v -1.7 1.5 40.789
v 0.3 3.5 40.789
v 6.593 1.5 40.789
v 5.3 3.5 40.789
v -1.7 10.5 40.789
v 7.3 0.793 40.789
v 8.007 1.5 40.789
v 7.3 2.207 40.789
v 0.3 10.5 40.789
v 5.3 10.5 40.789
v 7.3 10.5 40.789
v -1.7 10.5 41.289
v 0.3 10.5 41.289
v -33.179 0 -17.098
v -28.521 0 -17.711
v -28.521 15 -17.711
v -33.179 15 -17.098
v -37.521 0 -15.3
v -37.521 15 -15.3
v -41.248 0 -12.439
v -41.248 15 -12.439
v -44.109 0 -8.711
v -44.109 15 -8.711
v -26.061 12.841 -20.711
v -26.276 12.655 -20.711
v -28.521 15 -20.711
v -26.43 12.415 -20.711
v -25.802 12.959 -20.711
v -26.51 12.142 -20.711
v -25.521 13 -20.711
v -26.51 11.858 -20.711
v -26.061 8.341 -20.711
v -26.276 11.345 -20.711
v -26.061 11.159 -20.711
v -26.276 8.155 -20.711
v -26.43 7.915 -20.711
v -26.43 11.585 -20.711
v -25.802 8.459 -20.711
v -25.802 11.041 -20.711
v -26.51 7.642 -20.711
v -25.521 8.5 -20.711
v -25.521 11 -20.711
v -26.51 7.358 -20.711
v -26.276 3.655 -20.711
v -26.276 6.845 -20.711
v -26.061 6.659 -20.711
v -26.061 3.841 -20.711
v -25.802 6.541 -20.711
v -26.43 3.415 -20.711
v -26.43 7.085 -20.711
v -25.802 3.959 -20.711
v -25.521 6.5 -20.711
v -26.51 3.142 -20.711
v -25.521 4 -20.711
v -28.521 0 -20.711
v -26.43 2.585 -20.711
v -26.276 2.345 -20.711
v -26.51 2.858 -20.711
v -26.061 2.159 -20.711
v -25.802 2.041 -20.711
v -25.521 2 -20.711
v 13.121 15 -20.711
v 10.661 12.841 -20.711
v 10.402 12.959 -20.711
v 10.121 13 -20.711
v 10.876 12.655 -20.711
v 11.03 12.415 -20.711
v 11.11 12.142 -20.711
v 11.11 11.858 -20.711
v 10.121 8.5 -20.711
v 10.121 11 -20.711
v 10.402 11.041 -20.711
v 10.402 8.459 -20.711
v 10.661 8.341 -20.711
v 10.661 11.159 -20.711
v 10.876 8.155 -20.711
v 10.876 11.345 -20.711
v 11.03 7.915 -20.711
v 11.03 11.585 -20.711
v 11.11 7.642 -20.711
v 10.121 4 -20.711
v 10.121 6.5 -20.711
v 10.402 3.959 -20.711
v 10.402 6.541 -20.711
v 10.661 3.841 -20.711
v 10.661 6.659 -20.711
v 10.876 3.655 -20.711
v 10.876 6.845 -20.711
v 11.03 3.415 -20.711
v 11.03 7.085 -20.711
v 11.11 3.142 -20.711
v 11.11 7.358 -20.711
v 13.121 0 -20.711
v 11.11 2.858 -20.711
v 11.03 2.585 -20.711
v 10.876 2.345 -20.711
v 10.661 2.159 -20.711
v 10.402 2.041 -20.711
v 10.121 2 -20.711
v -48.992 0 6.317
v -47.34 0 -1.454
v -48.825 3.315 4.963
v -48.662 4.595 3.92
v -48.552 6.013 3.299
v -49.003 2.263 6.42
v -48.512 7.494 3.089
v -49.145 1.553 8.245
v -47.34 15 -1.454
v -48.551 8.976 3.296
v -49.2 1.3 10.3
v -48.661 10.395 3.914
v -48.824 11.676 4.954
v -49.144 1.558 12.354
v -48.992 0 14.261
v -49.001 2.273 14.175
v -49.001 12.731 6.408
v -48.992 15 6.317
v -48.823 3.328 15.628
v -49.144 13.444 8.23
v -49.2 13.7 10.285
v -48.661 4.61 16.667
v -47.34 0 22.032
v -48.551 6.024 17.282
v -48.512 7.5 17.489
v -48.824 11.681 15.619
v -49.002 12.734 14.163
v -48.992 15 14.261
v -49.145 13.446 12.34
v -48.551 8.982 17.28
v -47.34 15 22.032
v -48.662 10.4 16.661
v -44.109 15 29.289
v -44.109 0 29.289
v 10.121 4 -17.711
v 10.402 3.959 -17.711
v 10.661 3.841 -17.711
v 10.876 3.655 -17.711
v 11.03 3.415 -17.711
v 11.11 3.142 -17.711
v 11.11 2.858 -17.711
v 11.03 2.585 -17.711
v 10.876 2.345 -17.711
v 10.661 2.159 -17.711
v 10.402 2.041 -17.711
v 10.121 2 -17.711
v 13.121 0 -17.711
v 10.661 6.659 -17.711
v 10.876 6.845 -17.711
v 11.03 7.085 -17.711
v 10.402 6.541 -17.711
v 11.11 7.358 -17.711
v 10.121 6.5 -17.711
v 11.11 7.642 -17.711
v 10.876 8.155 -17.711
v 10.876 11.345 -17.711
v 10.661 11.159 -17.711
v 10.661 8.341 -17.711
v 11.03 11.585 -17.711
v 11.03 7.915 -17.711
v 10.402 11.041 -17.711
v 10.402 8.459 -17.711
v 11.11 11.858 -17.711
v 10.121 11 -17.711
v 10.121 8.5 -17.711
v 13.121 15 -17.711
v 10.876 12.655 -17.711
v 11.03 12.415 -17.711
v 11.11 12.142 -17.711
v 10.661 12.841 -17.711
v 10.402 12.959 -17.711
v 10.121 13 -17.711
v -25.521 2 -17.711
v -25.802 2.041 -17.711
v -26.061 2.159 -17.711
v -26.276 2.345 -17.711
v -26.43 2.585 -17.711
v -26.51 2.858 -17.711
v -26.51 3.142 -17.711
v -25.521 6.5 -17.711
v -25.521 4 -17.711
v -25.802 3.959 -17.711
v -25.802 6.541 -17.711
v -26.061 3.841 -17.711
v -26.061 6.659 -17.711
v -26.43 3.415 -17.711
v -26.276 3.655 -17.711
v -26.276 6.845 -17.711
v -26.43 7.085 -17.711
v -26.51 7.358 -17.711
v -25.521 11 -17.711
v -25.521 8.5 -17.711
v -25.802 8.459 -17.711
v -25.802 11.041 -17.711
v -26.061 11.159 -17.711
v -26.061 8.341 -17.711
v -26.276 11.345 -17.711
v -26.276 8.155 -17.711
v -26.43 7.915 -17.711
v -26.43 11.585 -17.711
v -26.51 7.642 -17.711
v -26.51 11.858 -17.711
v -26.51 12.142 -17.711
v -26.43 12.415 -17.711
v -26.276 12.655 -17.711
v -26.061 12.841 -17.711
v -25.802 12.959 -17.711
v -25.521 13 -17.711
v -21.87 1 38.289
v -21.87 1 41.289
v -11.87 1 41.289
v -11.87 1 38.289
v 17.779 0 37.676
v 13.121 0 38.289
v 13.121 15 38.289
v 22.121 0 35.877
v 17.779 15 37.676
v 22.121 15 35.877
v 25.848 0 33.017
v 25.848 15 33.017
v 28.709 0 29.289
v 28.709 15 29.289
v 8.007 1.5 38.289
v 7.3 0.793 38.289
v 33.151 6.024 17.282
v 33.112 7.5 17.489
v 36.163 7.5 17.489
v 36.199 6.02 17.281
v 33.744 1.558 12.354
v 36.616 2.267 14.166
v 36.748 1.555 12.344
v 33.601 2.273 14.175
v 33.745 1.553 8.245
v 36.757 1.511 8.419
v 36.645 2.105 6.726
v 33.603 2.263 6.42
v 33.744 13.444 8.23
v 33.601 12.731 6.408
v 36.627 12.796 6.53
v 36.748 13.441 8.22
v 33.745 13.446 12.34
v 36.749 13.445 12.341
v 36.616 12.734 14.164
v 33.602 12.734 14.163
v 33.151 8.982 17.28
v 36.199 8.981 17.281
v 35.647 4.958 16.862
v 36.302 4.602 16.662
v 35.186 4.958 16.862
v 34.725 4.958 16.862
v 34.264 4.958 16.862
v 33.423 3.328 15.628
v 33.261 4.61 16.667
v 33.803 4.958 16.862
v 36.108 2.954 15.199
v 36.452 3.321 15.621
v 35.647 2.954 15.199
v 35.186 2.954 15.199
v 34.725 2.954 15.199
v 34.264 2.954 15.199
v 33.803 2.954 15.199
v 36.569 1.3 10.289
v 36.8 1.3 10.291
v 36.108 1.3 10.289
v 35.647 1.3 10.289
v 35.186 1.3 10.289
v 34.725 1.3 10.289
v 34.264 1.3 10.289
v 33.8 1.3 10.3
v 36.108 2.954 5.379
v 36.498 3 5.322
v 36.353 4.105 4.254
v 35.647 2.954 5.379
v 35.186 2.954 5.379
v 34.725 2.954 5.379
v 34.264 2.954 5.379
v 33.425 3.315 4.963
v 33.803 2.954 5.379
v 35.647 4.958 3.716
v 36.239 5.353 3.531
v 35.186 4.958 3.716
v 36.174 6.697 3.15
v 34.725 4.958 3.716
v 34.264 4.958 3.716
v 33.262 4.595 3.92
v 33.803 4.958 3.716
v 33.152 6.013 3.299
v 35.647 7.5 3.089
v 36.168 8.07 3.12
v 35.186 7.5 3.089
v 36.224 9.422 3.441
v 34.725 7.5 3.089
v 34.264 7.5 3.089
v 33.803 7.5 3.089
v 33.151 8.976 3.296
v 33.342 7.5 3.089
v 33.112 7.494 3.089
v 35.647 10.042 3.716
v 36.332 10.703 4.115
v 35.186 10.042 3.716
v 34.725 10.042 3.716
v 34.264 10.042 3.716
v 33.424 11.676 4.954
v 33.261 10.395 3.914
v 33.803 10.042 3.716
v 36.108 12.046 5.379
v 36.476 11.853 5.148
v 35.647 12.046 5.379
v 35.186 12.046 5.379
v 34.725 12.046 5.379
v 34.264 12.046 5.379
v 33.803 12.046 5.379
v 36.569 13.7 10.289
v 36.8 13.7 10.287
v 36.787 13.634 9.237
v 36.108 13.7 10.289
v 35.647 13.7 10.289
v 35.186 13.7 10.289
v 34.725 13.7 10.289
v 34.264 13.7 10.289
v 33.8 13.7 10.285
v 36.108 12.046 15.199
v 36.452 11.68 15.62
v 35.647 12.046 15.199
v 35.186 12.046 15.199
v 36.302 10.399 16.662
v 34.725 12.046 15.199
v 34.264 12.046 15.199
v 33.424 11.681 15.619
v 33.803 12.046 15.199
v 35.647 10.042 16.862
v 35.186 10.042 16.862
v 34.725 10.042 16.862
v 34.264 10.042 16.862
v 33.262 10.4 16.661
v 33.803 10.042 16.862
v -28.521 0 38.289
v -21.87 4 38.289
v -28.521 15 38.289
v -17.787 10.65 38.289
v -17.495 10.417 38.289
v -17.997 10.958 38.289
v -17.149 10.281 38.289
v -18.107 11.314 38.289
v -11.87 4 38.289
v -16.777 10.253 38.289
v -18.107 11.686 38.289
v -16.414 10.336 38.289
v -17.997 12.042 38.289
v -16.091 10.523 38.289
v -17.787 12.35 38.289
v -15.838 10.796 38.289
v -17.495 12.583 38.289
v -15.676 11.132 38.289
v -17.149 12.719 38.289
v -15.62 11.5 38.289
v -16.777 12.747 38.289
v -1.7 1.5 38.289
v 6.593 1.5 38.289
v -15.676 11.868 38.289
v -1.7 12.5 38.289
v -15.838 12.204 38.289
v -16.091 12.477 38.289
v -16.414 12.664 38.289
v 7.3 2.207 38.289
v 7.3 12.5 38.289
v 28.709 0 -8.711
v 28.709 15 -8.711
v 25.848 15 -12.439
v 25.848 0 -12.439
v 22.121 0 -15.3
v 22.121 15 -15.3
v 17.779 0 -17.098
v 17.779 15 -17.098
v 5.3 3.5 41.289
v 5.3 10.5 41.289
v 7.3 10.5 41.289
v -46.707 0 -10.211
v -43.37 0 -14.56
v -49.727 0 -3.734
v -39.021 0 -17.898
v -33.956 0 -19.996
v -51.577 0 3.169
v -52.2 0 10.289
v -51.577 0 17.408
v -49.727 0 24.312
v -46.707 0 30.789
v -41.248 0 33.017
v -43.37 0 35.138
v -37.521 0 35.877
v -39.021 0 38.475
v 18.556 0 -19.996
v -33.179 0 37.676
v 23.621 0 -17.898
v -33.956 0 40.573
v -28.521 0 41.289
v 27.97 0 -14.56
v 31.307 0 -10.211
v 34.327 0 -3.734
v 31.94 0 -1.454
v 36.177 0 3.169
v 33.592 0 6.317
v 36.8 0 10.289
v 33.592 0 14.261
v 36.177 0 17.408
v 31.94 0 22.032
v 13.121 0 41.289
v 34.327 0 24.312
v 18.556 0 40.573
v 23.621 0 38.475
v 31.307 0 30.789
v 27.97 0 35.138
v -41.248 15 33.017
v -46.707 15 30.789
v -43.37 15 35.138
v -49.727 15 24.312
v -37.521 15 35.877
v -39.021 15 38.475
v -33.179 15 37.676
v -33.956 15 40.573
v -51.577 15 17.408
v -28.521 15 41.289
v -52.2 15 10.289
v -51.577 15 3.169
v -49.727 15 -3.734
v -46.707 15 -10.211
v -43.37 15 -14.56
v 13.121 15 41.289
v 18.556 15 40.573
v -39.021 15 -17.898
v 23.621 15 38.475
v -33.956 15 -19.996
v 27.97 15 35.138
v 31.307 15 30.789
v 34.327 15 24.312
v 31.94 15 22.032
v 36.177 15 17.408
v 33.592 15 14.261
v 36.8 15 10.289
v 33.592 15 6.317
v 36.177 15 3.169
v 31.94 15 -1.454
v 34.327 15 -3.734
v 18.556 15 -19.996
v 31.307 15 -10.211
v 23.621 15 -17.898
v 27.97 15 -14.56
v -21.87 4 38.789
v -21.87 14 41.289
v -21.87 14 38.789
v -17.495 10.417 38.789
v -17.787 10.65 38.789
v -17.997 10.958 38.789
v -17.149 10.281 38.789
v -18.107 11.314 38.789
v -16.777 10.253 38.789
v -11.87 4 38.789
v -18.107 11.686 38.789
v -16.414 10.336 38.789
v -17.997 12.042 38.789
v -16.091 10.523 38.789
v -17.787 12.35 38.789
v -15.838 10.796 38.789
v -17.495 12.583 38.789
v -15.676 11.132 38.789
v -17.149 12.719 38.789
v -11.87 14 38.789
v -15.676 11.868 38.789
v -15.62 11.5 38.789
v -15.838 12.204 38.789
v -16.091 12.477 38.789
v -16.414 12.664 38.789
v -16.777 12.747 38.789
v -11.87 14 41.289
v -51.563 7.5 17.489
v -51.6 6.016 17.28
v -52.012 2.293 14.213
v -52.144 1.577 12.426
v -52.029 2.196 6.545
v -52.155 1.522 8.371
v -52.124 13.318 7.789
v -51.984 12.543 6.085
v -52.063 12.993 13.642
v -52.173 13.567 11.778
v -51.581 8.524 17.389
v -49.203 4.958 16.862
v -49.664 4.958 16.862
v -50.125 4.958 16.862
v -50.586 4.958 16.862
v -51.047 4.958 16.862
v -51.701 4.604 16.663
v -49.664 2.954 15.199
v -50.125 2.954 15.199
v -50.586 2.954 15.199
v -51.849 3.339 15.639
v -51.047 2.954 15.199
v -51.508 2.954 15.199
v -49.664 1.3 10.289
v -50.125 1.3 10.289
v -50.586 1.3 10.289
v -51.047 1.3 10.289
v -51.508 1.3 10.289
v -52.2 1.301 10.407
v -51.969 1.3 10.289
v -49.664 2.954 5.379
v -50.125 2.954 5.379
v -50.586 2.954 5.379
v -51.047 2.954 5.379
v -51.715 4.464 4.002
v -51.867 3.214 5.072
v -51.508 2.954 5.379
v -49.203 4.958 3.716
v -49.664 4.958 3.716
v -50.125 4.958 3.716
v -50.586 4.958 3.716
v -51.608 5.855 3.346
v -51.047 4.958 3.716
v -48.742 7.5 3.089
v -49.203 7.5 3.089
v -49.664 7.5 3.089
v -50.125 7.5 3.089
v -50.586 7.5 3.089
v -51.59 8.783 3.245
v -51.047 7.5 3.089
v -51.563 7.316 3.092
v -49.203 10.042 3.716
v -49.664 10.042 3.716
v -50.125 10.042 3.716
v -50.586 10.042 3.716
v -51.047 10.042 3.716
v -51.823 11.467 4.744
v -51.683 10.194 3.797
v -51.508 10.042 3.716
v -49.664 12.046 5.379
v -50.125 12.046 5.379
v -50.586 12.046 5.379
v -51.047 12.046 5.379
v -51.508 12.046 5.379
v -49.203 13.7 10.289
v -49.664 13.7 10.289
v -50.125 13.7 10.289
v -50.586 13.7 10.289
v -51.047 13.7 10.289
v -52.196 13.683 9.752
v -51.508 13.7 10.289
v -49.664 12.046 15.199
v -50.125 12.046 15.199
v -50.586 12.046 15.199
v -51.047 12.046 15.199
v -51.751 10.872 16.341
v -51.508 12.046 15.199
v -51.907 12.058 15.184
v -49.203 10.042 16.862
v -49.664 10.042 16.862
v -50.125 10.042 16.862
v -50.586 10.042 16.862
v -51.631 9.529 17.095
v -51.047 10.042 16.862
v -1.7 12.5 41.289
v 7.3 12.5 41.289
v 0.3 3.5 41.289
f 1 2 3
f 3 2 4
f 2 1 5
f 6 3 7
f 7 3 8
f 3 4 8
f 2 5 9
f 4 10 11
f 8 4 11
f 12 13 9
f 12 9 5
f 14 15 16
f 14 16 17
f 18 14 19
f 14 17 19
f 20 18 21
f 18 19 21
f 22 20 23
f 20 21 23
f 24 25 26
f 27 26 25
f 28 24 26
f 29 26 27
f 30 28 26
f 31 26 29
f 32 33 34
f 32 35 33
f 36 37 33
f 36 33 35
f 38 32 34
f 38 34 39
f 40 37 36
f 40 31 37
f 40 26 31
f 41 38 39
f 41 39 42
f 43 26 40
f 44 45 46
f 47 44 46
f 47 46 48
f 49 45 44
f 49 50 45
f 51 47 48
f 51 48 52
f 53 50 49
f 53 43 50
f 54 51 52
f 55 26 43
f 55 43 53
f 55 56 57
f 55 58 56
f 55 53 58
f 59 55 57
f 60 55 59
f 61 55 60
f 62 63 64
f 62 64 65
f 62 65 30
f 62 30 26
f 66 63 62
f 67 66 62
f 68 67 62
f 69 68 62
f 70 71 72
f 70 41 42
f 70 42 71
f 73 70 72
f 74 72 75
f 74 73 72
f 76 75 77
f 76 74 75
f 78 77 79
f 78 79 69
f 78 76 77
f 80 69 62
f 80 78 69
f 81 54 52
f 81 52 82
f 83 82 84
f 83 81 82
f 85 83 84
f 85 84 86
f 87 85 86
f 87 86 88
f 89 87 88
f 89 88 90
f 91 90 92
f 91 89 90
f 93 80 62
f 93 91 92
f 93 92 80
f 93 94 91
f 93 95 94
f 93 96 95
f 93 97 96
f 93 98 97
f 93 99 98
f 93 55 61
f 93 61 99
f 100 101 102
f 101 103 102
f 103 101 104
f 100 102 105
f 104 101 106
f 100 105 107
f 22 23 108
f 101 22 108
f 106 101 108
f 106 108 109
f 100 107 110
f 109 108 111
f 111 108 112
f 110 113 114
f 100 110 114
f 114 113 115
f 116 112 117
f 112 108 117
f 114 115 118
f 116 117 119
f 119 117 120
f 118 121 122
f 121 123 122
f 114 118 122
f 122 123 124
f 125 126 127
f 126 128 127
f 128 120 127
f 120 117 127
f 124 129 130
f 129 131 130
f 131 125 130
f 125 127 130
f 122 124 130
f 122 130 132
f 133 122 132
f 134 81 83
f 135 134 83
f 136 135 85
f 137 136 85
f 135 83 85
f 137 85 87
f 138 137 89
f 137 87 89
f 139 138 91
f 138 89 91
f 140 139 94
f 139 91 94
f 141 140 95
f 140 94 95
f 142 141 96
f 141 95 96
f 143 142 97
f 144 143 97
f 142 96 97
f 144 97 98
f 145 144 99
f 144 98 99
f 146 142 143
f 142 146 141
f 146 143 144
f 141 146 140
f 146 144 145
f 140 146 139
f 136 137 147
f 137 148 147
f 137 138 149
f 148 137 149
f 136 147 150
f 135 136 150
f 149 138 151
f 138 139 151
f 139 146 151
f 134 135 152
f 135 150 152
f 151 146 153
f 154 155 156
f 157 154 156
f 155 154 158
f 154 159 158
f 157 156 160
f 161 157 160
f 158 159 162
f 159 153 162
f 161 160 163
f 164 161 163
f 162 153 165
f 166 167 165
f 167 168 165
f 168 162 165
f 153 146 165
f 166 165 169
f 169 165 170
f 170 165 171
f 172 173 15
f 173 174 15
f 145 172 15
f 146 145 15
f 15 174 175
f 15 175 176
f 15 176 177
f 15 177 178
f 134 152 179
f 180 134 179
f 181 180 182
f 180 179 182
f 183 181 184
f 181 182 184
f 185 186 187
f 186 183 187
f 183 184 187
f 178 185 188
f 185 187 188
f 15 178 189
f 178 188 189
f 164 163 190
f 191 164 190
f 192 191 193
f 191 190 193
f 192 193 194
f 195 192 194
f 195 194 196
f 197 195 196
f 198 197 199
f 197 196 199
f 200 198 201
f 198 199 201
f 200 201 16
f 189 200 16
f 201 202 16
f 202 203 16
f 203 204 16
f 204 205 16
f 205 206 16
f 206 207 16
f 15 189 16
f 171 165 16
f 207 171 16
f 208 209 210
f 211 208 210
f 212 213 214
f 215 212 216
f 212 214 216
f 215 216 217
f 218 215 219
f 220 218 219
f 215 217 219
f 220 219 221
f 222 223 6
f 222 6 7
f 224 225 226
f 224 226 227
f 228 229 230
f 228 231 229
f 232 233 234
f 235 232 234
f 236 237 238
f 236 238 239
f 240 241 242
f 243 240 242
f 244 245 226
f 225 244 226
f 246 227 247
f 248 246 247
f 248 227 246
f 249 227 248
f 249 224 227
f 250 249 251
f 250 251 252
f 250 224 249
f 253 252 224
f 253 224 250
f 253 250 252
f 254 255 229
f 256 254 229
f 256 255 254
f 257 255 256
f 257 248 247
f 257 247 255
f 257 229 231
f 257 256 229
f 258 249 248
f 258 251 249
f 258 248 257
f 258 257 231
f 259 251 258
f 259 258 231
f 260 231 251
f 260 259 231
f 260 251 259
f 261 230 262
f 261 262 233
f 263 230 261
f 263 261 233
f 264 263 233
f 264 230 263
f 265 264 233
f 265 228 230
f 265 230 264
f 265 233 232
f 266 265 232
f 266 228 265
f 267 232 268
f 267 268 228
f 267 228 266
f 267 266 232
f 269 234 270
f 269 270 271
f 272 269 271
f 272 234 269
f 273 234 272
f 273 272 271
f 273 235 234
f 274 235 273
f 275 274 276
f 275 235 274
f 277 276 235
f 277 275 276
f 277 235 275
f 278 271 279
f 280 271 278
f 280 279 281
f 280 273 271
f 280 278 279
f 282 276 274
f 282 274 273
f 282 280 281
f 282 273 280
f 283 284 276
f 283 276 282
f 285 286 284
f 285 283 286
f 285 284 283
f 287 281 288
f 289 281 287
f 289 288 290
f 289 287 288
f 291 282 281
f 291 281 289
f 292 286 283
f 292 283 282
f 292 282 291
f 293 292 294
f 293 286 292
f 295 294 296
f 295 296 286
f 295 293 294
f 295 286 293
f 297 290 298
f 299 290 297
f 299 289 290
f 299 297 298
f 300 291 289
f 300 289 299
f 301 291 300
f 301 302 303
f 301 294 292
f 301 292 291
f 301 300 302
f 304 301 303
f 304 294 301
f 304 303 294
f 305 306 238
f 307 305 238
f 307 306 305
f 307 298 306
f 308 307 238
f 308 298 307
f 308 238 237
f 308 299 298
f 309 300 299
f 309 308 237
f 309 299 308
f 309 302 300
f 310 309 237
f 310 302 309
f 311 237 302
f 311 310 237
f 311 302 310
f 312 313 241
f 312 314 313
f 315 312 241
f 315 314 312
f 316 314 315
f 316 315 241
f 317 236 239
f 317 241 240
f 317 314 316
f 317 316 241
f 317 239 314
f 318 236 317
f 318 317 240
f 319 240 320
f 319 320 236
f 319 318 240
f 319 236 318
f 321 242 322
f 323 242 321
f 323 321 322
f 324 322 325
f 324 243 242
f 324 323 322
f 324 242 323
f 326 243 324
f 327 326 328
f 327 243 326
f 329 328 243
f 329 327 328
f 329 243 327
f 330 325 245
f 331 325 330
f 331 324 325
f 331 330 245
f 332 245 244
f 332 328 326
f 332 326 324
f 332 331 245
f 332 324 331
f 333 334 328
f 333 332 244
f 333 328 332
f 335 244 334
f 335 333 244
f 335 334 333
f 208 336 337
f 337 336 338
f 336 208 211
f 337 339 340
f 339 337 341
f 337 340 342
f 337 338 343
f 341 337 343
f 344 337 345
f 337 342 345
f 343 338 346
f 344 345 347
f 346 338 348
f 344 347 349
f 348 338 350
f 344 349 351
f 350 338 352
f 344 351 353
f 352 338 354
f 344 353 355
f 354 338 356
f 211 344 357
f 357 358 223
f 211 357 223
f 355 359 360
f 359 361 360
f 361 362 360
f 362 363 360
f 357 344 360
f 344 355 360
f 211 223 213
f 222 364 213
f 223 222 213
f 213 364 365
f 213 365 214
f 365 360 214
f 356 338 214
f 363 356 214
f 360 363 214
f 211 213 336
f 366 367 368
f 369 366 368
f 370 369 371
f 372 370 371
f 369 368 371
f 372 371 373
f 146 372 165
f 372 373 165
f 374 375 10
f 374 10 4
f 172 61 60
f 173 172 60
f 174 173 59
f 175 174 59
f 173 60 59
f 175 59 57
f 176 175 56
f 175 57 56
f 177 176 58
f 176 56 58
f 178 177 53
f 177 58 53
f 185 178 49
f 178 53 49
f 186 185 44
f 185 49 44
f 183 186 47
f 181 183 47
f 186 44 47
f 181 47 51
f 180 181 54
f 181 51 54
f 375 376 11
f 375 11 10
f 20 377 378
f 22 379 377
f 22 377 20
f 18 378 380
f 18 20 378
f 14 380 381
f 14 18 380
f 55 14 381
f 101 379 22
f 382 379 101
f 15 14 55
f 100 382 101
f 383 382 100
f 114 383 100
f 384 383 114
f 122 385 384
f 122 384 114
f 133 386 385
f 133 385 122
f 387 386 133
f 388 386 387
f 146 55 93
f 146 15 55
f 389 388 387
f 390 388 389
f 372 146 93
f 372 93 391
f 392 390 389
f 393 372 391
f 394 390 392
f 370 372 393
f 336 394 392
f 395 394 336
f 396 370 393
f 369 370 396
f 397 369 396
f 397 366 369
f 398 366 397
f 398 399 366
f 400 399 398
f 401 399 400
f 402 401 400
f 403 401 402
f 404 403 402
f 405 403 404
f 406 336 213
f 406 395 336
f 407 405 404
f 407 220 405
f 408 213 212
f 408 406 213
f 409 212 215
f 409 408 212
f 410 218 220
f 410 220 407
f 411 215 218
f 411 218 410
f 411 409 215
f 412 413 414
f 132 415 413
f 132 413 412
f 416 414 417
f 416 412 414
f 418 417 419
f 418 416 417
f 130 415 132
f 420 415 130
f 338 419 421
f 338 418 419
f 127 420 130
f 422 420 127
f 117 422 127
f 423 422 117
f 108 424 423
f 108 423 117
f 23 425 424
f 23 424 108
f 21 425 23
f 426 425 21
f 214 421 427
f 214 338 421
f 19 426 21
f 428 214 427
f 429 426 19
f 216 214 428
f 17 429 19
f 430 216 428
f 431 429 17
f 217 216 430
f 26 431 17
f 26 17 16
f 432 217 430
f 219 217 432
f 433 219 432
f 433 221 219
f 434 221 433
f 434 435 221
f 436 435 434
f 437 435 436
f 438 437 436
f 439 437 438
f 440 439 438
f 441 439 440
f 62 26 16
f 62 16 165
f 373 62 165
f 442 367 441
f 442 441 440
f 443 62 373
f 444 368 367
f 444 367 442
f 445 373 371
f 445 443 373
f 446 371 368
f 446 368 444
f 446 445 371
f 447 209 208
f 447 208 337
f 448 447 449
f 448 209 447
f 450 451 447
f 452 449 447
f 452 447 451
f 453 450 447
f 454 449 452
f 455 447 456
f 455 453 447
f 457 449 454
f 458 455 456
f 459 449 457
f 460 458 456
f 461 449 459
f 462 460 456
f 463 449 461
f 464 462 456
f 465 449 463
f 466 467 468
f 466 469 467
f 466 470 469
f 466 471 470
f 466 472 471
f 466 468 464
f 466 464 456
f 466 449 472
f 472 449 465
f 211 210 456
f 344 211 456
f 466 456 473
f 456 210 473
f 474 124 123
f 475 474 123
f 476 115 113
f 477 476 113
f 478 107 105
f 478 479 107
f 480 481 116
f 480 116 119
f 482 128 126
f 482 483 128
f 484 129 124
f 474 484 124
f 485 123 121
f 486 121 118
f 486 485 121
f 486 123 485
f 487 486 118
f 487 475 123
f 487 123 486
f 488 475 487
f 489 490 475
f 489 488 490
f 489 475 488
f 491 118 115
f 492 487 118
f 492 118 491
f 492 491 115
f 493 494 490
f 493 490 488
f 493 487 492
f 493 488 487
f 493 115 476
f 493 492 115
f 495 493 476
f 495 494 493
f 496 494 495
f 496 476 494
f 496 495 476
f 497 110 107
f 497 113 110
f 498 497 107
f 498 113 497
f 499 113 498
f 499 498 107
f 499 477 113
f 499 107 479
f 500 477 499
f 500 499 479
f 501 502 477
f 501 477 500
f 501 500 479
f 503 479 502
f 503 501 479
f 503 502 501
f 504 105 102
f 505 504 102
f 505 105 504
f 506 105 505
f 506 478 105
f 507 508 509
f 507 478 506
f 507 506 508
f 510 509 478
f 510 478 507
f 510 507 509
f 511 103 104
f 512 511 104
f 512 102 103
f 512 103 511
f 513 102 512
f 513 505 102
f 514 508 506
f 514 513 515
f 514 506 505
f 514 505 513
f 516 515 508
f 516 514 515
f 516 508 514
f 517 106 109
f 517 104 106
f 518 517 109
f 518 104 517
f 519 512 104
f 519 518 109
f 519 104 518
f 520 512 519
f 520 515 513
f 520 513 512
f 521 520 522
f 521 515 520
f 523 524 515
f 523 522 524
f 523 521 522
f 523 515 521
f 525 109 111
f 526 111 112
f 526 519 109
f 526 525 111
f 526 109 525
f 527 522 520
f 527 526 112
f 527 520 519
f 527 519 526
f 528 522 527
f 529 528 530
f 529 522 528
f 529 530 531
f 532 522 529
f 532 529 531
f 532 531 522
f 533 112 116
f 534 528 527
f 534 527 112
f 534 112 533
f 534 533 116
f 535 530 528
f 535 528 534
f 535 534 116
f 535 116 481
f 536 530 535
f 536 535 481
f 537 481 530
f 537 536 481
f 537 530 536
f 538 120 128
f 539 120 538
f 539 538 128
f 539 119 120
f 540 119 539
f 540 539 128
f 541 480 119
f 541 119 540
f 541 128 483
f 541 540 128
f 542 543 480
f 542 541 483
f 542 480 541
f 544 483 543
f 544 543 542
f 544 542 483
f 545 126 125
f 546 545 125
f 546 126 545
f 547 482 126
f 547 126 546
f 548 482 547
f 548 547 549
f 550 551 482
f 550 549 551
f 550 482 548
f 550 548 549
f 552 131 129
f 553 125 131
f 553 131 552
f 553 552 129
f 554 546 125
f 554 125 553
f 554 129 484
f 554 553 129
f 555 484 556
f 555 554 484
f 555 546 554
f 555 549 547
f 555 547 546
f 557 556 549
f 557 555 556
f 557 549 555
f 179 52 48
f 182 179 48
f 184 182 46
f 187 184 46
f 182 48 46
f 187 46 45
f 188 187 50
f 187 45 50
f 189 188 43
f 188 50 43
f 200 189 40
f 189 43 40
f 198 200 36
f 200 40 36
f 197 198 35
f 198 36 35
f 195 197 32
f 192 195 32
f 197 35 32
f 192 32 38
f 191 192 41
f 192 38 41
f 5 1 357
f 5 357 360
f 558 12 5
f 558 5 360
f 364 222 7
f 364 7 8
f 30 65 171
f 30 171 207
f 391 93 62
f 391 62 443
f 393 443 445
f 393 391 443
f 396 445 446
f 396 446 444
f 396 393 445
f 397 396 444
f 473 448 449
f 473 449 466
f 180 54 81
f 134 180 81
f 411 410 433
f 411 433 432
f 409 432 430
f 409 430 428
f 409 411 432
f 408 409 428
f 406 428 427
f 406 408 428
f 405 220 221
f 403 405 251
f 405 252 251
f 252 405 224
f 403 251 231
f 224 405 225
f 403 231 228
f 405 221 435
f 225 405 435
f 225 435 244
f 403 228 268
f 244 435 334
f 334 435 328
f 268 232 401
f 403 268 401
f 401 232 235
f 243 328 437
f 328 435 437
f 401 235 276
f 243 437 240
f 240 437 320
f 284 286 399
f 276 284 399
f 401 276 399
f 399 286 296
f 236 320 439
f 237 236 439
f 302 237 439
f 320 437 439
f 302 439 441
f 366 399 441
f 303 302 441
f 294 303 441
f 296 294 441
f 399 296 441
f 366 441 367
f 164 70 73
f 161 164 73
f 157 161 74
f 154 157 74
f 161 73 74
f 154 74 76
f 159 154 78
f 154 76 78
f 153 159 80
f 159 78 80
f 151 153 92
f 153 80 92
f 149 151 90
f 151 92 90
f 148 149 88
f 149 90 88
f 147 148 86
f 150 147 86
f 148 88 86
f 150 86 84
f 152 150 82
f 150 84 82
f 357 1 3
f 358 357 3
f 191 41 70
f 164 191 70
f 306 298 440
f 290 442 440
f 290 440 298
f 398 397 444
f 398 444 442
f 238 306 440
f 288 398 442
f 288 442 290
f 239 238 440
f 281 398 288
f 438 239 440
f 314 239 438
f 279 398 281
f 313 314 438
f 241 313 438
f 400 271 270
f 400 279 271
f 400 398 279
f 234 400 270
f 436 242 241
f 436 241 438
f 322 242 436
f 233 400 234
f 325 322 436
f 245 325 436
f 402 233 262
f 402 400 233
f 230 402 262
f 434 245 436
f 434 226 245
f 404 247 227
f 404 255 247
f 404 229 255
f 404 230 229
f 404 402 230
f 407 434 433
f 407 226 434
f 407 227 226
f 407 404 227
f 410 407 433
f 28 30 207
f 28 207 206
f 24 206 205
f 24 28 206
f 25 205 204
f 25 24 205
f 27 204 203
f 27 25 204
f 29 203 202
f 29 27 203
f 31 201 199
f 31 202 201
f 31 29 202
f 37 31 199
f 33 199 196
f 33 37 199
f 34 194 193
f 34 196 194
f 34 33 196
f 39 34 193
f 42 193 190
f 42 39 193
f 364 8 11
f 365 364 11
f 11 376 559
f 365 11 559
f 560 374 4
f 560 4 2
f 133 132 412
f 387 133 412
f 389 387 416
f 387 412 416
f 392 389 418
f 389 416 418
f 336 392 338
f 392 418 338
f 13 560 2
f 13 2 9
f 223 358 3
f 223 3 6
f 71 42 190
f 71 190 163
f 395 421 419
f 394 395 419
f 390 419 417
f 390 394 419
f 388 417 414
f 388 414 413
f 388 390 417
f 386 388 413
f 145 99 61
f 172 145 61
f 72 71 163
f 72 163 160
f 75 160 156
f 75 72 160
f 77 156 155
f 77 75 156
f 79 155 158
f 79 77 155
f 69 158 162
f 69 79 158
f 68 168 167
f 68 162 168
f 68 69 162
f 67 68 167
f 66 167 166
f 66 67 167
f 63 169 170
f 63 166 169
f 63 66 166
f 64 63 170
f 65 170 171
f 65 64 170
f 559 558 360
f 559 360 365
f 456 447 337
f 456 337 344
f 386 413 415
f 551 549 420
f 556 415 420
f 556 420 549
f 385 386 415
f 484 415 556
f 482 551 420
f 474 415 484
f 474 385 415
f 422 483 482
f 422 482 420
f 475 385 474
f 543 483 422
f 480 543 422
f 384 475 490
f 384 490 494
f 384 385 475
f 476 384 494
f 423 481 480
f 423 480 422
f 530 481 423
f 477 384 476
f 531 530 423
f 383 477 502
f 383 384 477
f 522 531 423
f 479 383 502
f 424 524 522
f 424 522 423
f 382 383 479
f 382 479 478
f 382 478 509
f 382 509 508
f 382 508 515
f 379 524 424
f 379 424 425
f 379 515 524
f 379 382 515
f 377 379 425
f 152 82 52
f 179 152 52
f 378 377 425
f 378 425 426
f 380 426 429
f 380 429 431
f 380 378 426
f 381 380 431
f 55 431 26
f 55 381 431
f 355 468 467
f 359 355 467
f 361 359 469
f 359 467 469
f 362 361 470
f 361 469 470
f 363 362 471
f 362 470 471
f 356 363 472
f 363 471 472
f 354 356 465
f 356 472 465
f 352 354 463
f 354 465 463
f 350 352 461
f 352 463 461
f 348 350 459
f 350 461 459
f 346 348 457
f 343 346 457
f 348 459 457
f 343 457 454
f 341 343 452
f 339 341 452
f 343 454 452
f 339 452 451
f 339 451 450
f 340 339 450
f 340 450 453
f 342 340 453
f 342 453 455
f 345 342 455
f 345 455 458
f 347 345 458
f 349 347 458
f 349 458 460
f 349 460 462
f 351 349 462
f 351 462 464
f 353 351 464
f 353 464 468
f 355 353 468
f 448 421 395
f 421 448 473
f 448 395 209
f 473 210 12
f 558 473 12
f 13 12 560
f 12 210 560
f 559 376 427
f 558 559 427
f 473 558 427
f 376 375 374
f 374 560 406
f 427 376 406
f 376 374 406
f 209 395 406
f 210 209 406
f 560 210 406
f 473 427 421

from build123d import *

# Parameters (mm, degrees)
SKETCH_1_W           = 89
SKETCH_1_H           = 62
EXTRUDE_1_DEPTH      = 15
CUT_EXTRUDE_START    = -15.000001
SKETCH_2_W           = 114.345269922
SKETCH_2_H           = 82.741202996
CUT_EXTRUDE_2_DEPTH  = 15.000002
CUT_EXTRUDE_3_REACH  = 70.225
CUT_EXTRUDE_6_REACH  = 84.425
SKETCH_4_W           = 9
SKETCH_4_H           = 11
FILLET_1_R           = 0.5
CUT_EXTRUDE_7_REACH  = 82.193
EXTRUDE_2_DEPTH      = 0.5
SKETCH_11_W          = 10
SKETCH_11_H          = 13
CUT_EXTRUDE_10_DEPTH = 2.5
SKETCH_12_R          = 1.25
SKETCH_12_W          = 10
SKETCH_12_H          = 3
CUT_EXTRUDE_11_DEPTH = 2.5
CUT_EXTRUDE_12_REACH = 84.425
CUT_EXTRUDE_START_2  = -52.200000102
CUT_EXTRUDE_13_DEPTH = 88.999999964


with BuildPart() as part:
    # 草图1 → 凸台-拉伸1 (new body)
    with BuildSketch(Plane(origin=(0, 0, 0), x_dir=(1, 0, 0), z_dir=(0, 1, 0))):
        with Locations((-7.7, -10.288888889)):
            Rectangle(SKETCH_1_W, SKETCH_1_H)
    extrude(amount=EXTRUDE_1_DEPTH)

    # 草图2 → 切除-拉伸2 (cut)
    with BuildSketch(Plane(origin=(0, 15, 0), x_dir=(1, 0, 0), z_dir=(0, 1, 0)).offset(CUT_EXTRUDE_START)):
        with Locations((-11.341983823, -7.488413354)):
            Rectangle(SKETCH_2_W, SKETCH_2_H)
        with BuildLine():
            Line((-28.520508076, 20.711111111), (13.120508076, 20.711111111))
            ThreePointArc((13.120508076, 20.711111111), (23.620508076, 17.897644591), (31.307041555, 10.211111111))
            ThreePointArc((31.307041555, 10.211111111), (36.8, -10.288888889), (31.307041555, -30.788888889))
            ThreePointArc((31.307041555, -30.788888889), (23.620508076, -38.475422368), (13.120508076, -41.288888889))
            Line((13.120508076, -41.288888889), (-28.520508076, -41.288888889))
            ThreePointArc((-28.520508076, -41.288888889), (-39.020508076, -38.475422368), (-46.707041555, -30.788888889))
            ThreePointArc((-46.707041555, -30.788888889), (-52.2, -10.288888889), (-46.707041555, 10.211111111))
            ThreePointArc((-46.707041555, 10.211111111), (-39.020508076, 17.897644591), (-28.520508076, 20.711111111))
        make_face(mode=Mode.SUBTRACT)
    extrude(amount=CUT_EXTRUDE_2_DEPTH, mode=Mode.SUBTRACT)

    # 草图3 → 切除-拉伸3 (cut, up to next)
    with BuildSketch(Plane(origin=(0, 15, 0), x_dir=(1, 0, 0), z_dir=(0, 1, 0)), mode=Mode.PRIVATE) as cut_extrude_3_sk1:
        with BuildLine():
            Line((-28.520508076, -38.288888889), (13.120508076, -38.288888889))
            ThreePointArc((13.120508076, -38.288888889), (22.120508076, -35.877346157), (28.708965344, -29.288888889))
            ThreePointArc((28.708965344, -29.288888889), (33.8, -10.288888889), (28.708965344, 8.711111111))
            ThreePointArc((28.708965344, 8.711111111), (22.120508076, 15.299568379), (13.120508076, 17.711111111))
            Line((13.120508076, 17.711111111), (-28.520508076, 17.711111111))
            ThreePointArc((-28.520508076, 17.711111111), (-37.520508076, 15.299568379), (-44.108965344, 8.711111111))
            ThreePointArc((-44.108965344, 8.711111111), (-49.2, -10.288888889), (-44.108965344, -29.288888889))
            ThreePointArc((-44.108965344, -29.288888889), (-37.520508076, -35.877346157), (-28.520508076, -38.288888889))
        make_face()
    cut_extrude_3_tool1 = extrude(cut_extrude_3_sk1.sketch, amount=-CUT_EXTRUDE_3_REACH, mode=Mode.PRIVATE) & part.part
    add(cut_extrude_3_tool1.solids().sort_by_distance((-7.7, 15, 10.288889))[0], mode=Mode.SUBTRACT)

    # 草图4 → 切除-拉伸6 (cut, up to next)
    with BuildSketch(Plane.XY.offset(41.288888889), mode=Mode.PRIVATE) as cut_extrude_6_sk1:
        with Locations((2.8, 7)):
            Rectangle(SKETCH_4_W, SKETCH_4_H)
    cut_extrude_6_tool1 = extrude(cut_extrude_6_sk1.sketch, amount=-CUT_EXTRUDE_6_REACH, mode=Mode.PRIVATE) & part.part
    add(cut_extrude_6_tool1.solids().sort_by_distance((2.8, 7, 41.288889))[0], mode=Mode.SUBTRACT)

    # 圆角1
    fillet_1_edges = [part.edges().sort_by_distance(p)[0] for p in [
        (7.3, 1.5, 39.788888889),
    ]]
    fillet(fillet_1_edges, radius=FILLET_1_R)

    # 草图7 → 切除-拉伸7 (cut, up to next)
    with BuildSketch(Plane(origin=(0, 0, 38.288888889), x_dir=(-1, 0, 0), z_dir=(0, 0, -1)), mode=Mode.PRIVATE) as cut_extrude_7_sk1:
        Polygon((-7.3, 2.207106781), (-6.592893219, 1.5), (-7.3, 0.792893219), (-8.007106781, 1.5), align=None)
    cut_extrude_7_tool1 = extrude(cut_extrude_7_sk1.sketch, amount=-CUT_EXTRUDE_7_REACH, mode=Mode.PRIVATE) & part.part
    add(cut_extrude_7_tool1.solids().sort_by_distance((7.3, 1.5, 38.288889))[0], mode=Mode.SUBTRACT)

    # 草图8 → 凸台-拉伸2 (add)
    with BuildSketch(Plane.XY.offset(41.288888889)):
        Polygon((-1.7, 1.5), (-1.7, 0), (10.425334972, 0), (10.425334972, 10.5), (7.3, 10.5), (5.3, 10.5), (5.3, 3.5), (0.3, 3.5), (0.3, 10.5), (-1.7, 10.5), align=None)
    extrude(amount=-EXTRUDE_2_DEPTH)

    # 草图11 → 切除-拉伸10 (cut)
    with BuildSketch(Plane.XY.offset(41.288888889)):
        with Locations((-16.870478922, 7.5)):
            Rectangle(SKETCH_11_W, SKETCH_11_H)
    extrude(amount=-CUT_EXTRUDE_10_DEPTH, mode=Mode.SUBTRACT)

    # 草图12 → 切除-拉伸11 (cut)
    with BuildSketch(Plane.XY.offset(38.788888889)):
        with Locations((-16.870478922, 11.5)):
            Circle(SKETCH_12_R)
        with Locations((-16.870478922, 2.5)):
            Rectangle(SKETCH_12_W, SKETCH_12_H)
    extrude(amount=-CUT_EXTRUDE_11_DEPTH, mode=Mode.SUBTRACT)

    # 草图13 → 切除-拉伸12 (cut, up to next)
    with BuildSketch(Plane(origin=(0, 0, -20.711111111), x_dir=(-1, 0, 0), z_dir=(0, 0, -1)), mode=Mode.PRIVATE) as cut_extrude_12_sk1:
        with BuildLine():
            Line((-10.120508076, 13), (25.520508076, 13))
            ThreePointArc((25.520508076, 13), (26.520508076, 12), (25.520508076, 11))
            Line((25.520508076, 11), (-10.120508076, 11))
            ThreePointArc((-10.120508076, 11), (-11.120508076, 12), (-10.120508076, 13))
        make_face()
    cut_extrude_12_tool1 = extrude(cut_extrude_12_sk1.sketch, amount=-CUT_EXTRUDE_12_REACH, mode=Mode.PRIVATE) & part.part
    # 草图13 → 切除-拉伸12 (cut, up to next)
    with BuildSketch(Plane(origin=(0, 0, -20.711111111), x_dir=(-1, 0, 0), z_dir=(0, 0, -1)), mode=Mode.PRIVATE) as cut_extrude_12_sk2:
        with BuildLine():
            Line((-10.120508076, 6.5), (25.520508076, 6.5))
            ThreePointArc((25.520508076, 6.5), (26.520508076, 7.5), (25.520508076, 8.5))
            Line((25.520508076, 8.5), (-10.120508076, 8.5))
            ThreePointArc((-10.120508076, 8.5), (-11.120508076, 7.5), (-10.120508076, 6.5))
        make_face()
    cut_extrude_12_tool2 = extrude(cut_extrude_12_sk2.sketch, amount=-CUT_EXTRUDE_12_REACH, mode=Mode.PRIVATE) & part.part
    # 草图13 → 切除-拉伸12 (cut, up to next)
    with BuildSketch(Plane(origin=(0, 0, -20.711111111), x_dir=(-1, 0, 0), z_dir=(0, 0, -1)), mode=Mode.PRIVATE) as cut_extrude_12_sk3:
        with BuildLine():
            Line((-10.120508076, 2), (25.520508076, 2))
            ThreePointArc((25.520508076, 2), (26.520508076, 3), (25.520508076, 4))
            Line((25.520508076, 4), (-10.120508076, 4))
            ThreePointArc((-10.120508076, 4), (-11.120508076, 3), (-10.120508076, 2))
        make_face()
    cut_extrude_12_tool3 = extrude(cut_extrude_12_sk3.sketch, amount=-CUT_EXTRUDE_12_REACH, mode=Mode.PRIVATE) & part.part
    add(cut_extrude_12_tool1.solids().sort_by_distance((-7.7, 12, -20.711111))[0], mode=Mode.SUBTRACT)
    add(cut_extrude_12_tool2.solids().sort_by_distance((-7.7, 7.5, -20.711111))[0], mode=Mode.SUBTRACT)
    add(cut_extrude_12_tool3.solids().sort_by_distance((-7.7, 3, -20.711111))[0], mode=Mode.SUBTRACT)

    # 切除-拉伸13: read off the stored shape, not the designer's step
    # 切除-拉伸13 outline → 切除-拉伸13 (cut)
    with BuildSketch(Plane(origin=(0, 0, 0), x_dir=(0, 0, -1), z_dir=(1, 0, 0)).offset(CUT_EXTRUDE_START_2)):
        with BuildLine():
            add(Edge.make_bspline(
                [(-17.488888889, 7.5), (-17.488888889, 6.618712307), (-17.038806778, 4.85613692), (-15.30252013, 2.82180753), (-12.943624098, 1.578601929), (-10.288888889, 1.160699036), (-7.634153679, 1.578601929), (-5.275257648, 2.82180753), (-3.538970999, 4.85613692), (-2.863847834, 7.5), (-3.538970999, 10.14386308), (-5.275257648, 12.17819247), (-7.634153679, 13.421398071), (-10.288888889, 13.839300964), (-12.943624098, 13.421398071), (-15.30252013, 12.17819247), (-17.038806778, 10.14386308), (-17.488888889, 8.381287693), (-17.488888889, 7.5)],
                knots=[0, 0, 0, 0, 0.392699082, 0.785398163, 1.178097245, 1.570796327, 1.963495408, 2.35619449, 2.748893572, 3.141592654, 3.534291735, 3.926990817, 4.319689899, 4.71238898, 5.105088062, 5.497787144, 5.890486225, 6.283185307, 6.283185307, 6.283185307, 6.283185307], degree=3))
        make_face()
    extrude(amount=CUT_EXTRUDE_13_DEPTH, mode=Mode.SUBTRACT)


solid = part.part
